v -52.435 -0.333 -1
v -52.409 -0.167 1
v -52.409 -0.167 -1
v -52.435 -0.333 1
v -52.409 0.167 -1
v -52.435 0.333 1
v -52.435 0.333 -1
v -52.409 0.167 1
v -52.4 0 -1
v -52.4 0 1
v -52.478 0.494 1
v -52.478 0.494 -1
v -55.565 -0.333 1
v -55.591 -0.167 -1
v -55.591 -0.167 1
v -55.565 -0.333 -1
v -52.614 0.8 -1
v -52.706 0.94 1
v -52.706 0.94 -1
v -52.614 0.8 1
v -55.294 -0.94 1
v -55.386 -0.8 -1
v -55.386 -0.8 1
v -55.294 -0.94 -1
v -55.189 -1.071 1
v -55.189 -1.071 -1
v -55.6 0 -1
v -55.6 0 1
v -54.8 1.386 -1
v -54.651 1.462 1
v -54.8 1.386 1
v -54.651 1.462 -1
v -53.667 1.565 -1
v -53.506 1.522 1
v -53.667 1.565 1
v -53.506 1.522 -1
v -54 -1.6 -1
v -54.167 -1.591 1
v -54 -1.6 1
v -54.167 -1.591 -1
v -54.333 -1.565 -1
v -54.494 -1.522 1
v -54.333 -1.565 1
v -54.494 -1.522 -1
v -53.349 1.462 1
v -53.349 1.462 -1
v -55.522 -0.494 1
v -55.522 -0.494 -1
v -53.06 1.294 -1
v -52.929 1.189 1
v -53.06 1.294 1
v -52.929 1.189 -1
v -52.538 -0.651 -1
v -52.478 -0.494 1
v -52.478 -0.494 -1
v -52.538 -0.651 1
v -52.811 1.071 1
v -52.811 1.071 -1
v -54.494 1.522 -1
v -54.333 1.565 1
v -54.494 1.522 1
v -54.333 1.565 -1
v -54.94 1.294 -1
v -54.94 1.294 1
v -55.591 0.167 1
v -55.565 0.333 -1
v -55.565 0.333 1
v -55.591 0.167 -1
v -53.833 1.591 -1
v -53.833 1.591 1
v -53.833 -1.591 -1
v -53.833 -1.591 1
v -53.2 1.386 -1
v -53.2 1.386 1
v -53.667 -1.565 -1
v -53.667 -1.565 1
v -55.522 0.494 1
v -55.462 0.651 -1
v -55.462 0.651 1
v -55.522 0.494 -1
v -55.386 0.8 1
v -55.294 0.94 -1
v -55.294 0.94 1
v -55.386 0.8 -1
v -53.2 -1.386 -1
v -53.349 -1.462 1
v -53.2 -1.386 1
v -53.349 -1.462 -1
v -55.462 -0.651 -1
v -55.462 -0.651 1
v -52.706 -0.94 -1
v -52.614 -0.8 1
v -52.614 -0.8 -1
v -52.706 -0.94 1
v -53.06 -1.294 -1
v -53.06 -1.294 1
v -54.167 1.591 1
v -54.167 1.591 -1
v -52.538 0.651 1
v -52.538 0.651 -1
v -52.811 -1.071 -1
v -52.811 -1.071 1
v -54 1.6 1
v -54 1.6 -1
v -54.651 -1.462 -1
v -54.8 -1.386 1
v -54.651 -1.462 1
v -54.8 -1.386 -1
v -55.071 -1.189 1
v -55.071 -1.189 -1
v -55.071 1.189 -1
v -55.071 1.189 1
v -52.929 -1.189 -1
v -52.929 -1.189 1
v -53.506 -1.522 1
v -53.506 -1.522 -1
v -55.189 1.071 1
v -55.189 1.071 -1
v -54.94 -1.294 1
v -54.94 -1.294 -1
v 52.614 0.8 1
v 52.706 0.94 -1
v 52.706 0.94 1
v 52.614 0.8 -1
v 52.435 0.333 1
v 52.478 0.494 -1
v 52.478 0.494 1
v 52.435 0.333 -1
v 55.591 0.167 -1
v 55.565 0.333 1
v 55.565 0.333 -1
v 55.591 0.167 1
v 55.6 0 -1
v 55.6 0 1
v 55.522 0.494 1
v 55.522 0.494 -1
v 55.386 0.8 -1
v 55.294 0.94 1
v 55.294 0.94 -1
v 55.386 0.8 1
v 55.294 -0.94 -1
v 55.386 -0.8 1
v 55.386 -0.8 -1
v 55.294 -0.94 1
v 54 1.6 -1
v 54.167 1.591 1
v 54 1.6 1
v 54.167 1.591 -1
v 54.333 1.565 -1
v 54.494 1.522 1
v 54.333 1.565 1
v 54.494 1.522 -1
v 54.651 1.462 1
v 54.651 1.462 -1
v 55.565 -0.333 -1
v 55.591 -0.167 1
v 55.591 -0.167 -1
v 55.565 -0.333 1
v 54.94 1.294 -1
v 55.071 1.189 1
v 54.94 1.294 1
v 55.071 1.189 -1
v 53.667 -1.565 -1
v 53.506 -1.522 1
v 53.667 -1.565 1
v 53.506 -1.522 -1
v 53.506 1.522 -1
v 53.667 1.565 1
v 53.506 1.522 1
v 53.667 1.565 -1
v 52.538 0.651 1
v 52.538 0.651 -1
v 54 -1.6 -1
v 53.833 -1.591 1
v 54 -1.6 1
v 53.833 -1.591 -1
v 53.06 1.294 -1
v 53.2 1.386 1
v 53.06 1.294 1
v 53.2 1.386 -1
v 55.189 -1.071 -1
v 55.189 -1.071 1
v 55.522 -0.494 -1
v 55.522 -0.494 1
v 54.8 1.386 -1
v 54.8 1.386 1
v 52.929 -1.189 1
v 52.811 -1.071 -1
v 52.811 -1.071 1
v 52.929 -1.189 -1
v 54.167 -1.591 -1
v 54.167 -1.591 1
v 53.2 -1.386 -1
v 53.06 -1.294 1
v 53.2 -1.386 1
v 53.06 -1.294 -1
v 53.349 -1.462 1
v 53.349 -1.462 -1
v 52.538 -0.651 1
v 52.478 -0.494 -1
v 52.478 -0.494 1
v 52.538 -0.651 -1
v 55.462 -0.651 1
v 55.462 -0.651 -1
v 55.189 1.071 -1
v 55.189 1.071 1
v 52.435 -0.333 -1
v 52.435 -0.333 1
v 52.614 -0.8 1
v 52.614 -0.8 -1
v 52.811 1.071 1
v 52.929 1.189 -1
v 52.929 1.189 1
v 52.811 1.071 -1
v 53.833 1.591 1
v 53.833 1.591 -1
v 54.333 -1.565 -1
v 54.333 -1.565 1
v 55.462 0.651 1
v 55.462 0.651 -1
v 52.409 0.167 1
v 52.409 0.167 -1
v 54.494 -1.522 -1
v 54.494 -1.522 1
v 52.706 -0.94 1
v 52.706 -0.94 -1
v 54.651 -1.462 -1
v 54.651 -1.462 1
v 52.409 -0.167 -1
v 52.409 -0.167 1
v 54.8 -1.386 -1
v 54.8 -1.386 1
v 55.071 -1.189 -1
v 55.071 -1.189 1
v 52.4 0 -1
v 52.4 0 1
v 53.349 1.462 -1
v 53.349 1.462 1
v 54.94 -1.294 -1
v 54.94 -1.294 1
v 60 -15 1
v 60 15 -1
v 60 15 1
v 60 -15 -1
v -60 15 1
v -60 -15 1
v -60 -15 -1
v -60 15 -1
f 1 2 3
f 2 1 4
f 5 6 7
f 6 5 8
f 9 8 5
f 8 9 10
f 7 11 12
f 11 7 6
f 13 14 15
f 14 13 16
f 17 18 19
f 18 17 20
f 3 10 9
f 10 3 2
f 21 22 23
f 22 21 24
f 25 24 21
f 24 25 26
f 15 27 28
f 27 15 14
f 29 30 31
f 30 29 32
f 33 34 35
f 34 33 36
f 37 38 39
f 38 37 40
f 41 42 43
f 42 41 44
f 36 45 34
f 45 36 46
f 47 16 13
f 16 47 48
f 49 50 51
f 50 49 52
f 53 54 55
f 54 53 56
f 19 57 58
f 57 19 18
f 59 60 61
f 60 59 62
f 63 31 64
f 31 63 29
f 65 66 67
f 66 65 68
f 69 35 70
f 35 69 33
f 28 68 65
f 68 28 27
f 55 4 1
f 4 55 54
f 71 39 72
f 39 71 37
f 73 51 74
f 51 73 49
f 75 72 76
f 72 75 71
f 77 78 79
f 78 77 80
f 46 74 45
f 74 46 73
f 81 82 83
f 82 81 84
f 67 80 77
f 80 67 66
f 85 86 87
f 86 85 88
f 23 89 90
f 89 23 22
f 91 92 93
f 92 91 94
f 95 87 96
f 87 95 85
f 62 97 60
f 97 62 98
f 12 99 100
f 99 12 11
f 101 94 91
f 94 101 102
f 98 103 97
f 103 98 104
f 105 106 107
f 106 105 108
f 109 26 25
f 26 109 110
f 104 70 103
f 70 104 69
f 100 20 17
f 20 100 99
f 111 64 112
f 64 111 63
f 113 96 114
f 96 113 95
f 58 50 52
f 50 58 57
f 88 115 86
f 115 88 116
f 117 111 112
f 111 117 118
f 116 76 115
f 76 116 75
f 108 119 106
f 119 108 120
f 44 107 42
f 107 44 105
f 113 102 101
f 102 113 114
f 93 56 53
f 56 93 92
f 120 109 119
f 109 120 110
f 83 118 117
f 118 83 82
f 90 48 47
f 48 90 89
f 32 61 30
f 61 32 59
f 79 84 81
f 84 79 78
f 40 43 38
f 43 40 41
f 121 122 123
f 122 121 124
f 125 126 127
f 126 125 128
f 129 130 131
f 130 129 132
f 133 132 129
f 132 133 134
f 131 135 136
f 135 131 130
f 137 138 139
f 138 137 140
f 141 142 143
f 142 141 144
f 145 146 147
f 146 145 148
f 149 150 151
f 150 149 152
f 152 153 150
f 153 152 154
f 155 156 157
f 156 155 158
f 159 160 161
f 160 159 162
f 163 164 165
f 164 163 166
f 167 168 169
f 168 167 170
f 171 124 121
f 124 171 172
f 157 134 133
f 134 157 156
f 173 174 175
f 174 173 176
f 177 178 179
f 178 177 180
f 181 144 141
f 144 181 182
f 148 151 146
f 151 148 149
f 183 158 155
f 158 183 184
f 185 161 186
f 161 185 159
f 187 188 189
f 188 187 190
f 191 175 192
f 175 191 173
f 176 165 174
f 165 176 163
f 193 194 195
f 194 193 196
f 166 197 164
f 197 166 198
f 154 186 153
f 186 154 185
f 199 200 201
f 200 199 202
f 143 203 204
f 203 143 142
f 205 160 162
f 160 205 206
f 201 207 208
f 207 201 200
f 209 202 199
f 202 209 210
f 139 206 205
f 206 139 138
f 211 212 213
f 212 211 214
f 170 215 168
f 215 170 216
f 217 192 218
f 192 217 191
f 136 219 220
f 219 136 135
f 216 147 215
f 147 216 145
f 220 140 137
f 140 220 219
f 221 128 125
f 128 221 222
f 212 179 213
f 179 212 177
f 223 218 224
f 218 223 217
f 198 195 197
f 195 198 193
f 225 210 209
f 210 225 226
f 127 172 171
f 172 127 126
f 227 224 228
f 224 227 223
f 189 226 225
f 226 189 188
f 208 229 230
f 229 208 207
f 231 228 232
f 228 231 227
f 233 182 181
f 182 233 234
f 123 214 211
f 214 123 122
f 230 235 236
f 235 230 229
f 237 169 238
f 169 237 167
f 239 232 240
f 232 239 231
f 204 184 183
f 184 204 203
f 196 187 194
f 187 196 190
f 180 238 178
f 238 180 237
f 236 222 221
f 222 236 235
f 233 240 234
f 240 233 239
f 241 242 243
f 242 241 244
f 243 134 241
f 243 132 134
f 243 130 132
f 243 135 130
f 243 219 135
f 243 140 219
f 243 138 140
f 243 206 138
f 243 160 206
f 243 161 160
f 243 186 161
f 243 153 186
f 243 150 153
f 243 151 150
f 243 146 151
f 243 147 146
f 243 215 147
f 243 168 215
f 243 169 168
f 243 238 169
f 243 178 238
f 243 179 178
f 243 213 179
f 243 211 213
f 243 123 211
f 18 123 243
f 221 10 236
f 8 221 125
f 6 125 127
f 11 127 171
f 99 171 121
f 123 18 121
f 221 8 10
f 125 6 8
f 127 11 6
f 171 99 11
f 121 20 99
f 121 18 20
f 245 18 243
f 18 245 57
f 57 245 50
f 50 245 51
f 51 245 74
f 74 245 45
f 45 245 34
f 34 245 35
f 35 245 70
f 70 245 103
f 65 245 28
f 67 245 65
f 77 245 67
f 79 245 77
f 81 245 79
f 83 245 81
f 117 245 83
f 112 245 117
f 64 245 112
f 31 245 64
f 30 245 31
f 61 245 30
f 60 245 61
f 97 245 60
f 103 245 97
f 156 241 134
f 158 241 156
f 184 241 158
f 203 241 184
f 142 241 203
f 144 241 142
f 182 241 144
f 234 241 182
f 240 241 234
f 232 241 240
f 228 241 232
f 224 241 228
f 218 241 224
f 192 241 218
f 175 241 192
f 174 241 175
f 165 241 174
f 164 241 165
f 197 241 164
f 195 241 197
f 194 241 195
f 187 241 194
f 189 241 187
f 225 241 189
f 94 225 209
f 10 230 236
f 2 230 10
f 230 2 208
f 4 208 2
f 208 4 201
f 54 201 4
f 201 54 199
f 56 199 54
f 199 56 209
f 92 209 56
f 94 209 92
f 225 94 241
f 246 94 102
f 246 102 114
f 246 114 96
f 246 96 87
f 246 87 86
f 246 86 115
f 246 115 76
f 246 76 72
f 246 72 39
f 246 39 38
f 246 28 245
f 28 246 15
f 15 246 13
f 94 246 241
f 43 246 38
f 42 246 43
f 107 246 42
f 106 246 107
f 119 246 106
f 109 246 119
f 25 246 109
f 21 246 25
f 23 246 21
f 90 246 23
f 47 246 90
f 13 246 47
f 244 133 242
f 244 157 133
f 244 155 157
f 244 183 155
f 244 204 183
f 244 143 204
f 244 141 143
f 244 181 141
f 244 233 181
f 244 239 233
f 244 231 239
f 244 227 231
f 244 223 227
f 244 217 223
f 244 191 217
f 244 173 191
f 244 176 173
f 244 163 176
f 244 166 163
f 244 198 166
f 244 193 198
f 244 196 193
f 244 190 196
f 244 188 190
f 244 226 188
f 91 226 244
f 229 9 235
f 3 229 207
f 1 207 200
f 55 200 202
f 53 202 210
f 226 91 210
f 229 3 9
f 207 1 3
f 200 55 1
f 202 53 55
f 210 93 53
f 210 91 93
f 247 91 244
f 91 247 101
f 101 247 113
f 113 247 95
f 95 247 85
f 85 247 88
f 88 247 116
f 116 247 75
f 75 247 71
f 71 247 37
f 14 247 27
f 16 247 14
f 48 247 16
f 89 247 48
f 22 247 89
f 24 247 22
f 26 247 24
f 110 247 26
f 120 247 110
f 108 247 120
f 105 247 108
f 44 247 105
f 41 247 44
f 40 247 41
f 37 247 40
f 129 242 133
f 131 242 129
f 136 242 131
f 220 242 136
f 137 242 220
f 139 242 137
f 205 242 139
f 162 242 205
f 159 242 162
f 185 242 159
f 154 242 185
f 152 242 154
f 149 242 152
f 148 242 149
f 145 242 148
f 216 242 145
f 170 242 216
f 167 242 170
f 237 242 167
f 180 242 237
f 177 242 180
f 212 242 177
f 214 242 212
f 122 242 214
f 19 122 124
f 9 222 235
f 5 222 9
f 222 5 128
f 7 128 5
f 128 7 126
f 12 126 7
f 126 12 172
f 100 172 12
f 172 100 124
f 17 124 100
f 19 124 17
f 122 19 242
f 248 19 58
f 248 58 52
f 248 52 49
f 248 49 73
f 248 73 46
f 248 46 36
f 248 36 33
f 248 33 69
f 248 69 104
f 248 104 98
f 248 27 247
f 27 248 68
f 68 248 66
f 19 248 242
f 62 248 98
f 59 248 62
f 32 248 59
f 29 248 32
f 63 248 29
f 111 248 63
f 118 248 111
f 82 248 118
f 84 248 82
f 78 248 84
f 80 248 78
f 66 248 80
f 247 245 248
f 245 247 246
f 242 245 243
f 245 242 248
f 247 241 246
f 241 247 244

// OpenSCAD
// Engraving-ready nameplate.
$fn = 60;
eps = 0.02;
length = 120;
width = 30;
thickness = 2;
difference() { cube([length,width,thickness],center=true); for(x=[-length/2+6,length/2-6]) translate([x,0,-thickness/2-eps]) cylinder(d=3.2,h=thickness+2*eps); }
